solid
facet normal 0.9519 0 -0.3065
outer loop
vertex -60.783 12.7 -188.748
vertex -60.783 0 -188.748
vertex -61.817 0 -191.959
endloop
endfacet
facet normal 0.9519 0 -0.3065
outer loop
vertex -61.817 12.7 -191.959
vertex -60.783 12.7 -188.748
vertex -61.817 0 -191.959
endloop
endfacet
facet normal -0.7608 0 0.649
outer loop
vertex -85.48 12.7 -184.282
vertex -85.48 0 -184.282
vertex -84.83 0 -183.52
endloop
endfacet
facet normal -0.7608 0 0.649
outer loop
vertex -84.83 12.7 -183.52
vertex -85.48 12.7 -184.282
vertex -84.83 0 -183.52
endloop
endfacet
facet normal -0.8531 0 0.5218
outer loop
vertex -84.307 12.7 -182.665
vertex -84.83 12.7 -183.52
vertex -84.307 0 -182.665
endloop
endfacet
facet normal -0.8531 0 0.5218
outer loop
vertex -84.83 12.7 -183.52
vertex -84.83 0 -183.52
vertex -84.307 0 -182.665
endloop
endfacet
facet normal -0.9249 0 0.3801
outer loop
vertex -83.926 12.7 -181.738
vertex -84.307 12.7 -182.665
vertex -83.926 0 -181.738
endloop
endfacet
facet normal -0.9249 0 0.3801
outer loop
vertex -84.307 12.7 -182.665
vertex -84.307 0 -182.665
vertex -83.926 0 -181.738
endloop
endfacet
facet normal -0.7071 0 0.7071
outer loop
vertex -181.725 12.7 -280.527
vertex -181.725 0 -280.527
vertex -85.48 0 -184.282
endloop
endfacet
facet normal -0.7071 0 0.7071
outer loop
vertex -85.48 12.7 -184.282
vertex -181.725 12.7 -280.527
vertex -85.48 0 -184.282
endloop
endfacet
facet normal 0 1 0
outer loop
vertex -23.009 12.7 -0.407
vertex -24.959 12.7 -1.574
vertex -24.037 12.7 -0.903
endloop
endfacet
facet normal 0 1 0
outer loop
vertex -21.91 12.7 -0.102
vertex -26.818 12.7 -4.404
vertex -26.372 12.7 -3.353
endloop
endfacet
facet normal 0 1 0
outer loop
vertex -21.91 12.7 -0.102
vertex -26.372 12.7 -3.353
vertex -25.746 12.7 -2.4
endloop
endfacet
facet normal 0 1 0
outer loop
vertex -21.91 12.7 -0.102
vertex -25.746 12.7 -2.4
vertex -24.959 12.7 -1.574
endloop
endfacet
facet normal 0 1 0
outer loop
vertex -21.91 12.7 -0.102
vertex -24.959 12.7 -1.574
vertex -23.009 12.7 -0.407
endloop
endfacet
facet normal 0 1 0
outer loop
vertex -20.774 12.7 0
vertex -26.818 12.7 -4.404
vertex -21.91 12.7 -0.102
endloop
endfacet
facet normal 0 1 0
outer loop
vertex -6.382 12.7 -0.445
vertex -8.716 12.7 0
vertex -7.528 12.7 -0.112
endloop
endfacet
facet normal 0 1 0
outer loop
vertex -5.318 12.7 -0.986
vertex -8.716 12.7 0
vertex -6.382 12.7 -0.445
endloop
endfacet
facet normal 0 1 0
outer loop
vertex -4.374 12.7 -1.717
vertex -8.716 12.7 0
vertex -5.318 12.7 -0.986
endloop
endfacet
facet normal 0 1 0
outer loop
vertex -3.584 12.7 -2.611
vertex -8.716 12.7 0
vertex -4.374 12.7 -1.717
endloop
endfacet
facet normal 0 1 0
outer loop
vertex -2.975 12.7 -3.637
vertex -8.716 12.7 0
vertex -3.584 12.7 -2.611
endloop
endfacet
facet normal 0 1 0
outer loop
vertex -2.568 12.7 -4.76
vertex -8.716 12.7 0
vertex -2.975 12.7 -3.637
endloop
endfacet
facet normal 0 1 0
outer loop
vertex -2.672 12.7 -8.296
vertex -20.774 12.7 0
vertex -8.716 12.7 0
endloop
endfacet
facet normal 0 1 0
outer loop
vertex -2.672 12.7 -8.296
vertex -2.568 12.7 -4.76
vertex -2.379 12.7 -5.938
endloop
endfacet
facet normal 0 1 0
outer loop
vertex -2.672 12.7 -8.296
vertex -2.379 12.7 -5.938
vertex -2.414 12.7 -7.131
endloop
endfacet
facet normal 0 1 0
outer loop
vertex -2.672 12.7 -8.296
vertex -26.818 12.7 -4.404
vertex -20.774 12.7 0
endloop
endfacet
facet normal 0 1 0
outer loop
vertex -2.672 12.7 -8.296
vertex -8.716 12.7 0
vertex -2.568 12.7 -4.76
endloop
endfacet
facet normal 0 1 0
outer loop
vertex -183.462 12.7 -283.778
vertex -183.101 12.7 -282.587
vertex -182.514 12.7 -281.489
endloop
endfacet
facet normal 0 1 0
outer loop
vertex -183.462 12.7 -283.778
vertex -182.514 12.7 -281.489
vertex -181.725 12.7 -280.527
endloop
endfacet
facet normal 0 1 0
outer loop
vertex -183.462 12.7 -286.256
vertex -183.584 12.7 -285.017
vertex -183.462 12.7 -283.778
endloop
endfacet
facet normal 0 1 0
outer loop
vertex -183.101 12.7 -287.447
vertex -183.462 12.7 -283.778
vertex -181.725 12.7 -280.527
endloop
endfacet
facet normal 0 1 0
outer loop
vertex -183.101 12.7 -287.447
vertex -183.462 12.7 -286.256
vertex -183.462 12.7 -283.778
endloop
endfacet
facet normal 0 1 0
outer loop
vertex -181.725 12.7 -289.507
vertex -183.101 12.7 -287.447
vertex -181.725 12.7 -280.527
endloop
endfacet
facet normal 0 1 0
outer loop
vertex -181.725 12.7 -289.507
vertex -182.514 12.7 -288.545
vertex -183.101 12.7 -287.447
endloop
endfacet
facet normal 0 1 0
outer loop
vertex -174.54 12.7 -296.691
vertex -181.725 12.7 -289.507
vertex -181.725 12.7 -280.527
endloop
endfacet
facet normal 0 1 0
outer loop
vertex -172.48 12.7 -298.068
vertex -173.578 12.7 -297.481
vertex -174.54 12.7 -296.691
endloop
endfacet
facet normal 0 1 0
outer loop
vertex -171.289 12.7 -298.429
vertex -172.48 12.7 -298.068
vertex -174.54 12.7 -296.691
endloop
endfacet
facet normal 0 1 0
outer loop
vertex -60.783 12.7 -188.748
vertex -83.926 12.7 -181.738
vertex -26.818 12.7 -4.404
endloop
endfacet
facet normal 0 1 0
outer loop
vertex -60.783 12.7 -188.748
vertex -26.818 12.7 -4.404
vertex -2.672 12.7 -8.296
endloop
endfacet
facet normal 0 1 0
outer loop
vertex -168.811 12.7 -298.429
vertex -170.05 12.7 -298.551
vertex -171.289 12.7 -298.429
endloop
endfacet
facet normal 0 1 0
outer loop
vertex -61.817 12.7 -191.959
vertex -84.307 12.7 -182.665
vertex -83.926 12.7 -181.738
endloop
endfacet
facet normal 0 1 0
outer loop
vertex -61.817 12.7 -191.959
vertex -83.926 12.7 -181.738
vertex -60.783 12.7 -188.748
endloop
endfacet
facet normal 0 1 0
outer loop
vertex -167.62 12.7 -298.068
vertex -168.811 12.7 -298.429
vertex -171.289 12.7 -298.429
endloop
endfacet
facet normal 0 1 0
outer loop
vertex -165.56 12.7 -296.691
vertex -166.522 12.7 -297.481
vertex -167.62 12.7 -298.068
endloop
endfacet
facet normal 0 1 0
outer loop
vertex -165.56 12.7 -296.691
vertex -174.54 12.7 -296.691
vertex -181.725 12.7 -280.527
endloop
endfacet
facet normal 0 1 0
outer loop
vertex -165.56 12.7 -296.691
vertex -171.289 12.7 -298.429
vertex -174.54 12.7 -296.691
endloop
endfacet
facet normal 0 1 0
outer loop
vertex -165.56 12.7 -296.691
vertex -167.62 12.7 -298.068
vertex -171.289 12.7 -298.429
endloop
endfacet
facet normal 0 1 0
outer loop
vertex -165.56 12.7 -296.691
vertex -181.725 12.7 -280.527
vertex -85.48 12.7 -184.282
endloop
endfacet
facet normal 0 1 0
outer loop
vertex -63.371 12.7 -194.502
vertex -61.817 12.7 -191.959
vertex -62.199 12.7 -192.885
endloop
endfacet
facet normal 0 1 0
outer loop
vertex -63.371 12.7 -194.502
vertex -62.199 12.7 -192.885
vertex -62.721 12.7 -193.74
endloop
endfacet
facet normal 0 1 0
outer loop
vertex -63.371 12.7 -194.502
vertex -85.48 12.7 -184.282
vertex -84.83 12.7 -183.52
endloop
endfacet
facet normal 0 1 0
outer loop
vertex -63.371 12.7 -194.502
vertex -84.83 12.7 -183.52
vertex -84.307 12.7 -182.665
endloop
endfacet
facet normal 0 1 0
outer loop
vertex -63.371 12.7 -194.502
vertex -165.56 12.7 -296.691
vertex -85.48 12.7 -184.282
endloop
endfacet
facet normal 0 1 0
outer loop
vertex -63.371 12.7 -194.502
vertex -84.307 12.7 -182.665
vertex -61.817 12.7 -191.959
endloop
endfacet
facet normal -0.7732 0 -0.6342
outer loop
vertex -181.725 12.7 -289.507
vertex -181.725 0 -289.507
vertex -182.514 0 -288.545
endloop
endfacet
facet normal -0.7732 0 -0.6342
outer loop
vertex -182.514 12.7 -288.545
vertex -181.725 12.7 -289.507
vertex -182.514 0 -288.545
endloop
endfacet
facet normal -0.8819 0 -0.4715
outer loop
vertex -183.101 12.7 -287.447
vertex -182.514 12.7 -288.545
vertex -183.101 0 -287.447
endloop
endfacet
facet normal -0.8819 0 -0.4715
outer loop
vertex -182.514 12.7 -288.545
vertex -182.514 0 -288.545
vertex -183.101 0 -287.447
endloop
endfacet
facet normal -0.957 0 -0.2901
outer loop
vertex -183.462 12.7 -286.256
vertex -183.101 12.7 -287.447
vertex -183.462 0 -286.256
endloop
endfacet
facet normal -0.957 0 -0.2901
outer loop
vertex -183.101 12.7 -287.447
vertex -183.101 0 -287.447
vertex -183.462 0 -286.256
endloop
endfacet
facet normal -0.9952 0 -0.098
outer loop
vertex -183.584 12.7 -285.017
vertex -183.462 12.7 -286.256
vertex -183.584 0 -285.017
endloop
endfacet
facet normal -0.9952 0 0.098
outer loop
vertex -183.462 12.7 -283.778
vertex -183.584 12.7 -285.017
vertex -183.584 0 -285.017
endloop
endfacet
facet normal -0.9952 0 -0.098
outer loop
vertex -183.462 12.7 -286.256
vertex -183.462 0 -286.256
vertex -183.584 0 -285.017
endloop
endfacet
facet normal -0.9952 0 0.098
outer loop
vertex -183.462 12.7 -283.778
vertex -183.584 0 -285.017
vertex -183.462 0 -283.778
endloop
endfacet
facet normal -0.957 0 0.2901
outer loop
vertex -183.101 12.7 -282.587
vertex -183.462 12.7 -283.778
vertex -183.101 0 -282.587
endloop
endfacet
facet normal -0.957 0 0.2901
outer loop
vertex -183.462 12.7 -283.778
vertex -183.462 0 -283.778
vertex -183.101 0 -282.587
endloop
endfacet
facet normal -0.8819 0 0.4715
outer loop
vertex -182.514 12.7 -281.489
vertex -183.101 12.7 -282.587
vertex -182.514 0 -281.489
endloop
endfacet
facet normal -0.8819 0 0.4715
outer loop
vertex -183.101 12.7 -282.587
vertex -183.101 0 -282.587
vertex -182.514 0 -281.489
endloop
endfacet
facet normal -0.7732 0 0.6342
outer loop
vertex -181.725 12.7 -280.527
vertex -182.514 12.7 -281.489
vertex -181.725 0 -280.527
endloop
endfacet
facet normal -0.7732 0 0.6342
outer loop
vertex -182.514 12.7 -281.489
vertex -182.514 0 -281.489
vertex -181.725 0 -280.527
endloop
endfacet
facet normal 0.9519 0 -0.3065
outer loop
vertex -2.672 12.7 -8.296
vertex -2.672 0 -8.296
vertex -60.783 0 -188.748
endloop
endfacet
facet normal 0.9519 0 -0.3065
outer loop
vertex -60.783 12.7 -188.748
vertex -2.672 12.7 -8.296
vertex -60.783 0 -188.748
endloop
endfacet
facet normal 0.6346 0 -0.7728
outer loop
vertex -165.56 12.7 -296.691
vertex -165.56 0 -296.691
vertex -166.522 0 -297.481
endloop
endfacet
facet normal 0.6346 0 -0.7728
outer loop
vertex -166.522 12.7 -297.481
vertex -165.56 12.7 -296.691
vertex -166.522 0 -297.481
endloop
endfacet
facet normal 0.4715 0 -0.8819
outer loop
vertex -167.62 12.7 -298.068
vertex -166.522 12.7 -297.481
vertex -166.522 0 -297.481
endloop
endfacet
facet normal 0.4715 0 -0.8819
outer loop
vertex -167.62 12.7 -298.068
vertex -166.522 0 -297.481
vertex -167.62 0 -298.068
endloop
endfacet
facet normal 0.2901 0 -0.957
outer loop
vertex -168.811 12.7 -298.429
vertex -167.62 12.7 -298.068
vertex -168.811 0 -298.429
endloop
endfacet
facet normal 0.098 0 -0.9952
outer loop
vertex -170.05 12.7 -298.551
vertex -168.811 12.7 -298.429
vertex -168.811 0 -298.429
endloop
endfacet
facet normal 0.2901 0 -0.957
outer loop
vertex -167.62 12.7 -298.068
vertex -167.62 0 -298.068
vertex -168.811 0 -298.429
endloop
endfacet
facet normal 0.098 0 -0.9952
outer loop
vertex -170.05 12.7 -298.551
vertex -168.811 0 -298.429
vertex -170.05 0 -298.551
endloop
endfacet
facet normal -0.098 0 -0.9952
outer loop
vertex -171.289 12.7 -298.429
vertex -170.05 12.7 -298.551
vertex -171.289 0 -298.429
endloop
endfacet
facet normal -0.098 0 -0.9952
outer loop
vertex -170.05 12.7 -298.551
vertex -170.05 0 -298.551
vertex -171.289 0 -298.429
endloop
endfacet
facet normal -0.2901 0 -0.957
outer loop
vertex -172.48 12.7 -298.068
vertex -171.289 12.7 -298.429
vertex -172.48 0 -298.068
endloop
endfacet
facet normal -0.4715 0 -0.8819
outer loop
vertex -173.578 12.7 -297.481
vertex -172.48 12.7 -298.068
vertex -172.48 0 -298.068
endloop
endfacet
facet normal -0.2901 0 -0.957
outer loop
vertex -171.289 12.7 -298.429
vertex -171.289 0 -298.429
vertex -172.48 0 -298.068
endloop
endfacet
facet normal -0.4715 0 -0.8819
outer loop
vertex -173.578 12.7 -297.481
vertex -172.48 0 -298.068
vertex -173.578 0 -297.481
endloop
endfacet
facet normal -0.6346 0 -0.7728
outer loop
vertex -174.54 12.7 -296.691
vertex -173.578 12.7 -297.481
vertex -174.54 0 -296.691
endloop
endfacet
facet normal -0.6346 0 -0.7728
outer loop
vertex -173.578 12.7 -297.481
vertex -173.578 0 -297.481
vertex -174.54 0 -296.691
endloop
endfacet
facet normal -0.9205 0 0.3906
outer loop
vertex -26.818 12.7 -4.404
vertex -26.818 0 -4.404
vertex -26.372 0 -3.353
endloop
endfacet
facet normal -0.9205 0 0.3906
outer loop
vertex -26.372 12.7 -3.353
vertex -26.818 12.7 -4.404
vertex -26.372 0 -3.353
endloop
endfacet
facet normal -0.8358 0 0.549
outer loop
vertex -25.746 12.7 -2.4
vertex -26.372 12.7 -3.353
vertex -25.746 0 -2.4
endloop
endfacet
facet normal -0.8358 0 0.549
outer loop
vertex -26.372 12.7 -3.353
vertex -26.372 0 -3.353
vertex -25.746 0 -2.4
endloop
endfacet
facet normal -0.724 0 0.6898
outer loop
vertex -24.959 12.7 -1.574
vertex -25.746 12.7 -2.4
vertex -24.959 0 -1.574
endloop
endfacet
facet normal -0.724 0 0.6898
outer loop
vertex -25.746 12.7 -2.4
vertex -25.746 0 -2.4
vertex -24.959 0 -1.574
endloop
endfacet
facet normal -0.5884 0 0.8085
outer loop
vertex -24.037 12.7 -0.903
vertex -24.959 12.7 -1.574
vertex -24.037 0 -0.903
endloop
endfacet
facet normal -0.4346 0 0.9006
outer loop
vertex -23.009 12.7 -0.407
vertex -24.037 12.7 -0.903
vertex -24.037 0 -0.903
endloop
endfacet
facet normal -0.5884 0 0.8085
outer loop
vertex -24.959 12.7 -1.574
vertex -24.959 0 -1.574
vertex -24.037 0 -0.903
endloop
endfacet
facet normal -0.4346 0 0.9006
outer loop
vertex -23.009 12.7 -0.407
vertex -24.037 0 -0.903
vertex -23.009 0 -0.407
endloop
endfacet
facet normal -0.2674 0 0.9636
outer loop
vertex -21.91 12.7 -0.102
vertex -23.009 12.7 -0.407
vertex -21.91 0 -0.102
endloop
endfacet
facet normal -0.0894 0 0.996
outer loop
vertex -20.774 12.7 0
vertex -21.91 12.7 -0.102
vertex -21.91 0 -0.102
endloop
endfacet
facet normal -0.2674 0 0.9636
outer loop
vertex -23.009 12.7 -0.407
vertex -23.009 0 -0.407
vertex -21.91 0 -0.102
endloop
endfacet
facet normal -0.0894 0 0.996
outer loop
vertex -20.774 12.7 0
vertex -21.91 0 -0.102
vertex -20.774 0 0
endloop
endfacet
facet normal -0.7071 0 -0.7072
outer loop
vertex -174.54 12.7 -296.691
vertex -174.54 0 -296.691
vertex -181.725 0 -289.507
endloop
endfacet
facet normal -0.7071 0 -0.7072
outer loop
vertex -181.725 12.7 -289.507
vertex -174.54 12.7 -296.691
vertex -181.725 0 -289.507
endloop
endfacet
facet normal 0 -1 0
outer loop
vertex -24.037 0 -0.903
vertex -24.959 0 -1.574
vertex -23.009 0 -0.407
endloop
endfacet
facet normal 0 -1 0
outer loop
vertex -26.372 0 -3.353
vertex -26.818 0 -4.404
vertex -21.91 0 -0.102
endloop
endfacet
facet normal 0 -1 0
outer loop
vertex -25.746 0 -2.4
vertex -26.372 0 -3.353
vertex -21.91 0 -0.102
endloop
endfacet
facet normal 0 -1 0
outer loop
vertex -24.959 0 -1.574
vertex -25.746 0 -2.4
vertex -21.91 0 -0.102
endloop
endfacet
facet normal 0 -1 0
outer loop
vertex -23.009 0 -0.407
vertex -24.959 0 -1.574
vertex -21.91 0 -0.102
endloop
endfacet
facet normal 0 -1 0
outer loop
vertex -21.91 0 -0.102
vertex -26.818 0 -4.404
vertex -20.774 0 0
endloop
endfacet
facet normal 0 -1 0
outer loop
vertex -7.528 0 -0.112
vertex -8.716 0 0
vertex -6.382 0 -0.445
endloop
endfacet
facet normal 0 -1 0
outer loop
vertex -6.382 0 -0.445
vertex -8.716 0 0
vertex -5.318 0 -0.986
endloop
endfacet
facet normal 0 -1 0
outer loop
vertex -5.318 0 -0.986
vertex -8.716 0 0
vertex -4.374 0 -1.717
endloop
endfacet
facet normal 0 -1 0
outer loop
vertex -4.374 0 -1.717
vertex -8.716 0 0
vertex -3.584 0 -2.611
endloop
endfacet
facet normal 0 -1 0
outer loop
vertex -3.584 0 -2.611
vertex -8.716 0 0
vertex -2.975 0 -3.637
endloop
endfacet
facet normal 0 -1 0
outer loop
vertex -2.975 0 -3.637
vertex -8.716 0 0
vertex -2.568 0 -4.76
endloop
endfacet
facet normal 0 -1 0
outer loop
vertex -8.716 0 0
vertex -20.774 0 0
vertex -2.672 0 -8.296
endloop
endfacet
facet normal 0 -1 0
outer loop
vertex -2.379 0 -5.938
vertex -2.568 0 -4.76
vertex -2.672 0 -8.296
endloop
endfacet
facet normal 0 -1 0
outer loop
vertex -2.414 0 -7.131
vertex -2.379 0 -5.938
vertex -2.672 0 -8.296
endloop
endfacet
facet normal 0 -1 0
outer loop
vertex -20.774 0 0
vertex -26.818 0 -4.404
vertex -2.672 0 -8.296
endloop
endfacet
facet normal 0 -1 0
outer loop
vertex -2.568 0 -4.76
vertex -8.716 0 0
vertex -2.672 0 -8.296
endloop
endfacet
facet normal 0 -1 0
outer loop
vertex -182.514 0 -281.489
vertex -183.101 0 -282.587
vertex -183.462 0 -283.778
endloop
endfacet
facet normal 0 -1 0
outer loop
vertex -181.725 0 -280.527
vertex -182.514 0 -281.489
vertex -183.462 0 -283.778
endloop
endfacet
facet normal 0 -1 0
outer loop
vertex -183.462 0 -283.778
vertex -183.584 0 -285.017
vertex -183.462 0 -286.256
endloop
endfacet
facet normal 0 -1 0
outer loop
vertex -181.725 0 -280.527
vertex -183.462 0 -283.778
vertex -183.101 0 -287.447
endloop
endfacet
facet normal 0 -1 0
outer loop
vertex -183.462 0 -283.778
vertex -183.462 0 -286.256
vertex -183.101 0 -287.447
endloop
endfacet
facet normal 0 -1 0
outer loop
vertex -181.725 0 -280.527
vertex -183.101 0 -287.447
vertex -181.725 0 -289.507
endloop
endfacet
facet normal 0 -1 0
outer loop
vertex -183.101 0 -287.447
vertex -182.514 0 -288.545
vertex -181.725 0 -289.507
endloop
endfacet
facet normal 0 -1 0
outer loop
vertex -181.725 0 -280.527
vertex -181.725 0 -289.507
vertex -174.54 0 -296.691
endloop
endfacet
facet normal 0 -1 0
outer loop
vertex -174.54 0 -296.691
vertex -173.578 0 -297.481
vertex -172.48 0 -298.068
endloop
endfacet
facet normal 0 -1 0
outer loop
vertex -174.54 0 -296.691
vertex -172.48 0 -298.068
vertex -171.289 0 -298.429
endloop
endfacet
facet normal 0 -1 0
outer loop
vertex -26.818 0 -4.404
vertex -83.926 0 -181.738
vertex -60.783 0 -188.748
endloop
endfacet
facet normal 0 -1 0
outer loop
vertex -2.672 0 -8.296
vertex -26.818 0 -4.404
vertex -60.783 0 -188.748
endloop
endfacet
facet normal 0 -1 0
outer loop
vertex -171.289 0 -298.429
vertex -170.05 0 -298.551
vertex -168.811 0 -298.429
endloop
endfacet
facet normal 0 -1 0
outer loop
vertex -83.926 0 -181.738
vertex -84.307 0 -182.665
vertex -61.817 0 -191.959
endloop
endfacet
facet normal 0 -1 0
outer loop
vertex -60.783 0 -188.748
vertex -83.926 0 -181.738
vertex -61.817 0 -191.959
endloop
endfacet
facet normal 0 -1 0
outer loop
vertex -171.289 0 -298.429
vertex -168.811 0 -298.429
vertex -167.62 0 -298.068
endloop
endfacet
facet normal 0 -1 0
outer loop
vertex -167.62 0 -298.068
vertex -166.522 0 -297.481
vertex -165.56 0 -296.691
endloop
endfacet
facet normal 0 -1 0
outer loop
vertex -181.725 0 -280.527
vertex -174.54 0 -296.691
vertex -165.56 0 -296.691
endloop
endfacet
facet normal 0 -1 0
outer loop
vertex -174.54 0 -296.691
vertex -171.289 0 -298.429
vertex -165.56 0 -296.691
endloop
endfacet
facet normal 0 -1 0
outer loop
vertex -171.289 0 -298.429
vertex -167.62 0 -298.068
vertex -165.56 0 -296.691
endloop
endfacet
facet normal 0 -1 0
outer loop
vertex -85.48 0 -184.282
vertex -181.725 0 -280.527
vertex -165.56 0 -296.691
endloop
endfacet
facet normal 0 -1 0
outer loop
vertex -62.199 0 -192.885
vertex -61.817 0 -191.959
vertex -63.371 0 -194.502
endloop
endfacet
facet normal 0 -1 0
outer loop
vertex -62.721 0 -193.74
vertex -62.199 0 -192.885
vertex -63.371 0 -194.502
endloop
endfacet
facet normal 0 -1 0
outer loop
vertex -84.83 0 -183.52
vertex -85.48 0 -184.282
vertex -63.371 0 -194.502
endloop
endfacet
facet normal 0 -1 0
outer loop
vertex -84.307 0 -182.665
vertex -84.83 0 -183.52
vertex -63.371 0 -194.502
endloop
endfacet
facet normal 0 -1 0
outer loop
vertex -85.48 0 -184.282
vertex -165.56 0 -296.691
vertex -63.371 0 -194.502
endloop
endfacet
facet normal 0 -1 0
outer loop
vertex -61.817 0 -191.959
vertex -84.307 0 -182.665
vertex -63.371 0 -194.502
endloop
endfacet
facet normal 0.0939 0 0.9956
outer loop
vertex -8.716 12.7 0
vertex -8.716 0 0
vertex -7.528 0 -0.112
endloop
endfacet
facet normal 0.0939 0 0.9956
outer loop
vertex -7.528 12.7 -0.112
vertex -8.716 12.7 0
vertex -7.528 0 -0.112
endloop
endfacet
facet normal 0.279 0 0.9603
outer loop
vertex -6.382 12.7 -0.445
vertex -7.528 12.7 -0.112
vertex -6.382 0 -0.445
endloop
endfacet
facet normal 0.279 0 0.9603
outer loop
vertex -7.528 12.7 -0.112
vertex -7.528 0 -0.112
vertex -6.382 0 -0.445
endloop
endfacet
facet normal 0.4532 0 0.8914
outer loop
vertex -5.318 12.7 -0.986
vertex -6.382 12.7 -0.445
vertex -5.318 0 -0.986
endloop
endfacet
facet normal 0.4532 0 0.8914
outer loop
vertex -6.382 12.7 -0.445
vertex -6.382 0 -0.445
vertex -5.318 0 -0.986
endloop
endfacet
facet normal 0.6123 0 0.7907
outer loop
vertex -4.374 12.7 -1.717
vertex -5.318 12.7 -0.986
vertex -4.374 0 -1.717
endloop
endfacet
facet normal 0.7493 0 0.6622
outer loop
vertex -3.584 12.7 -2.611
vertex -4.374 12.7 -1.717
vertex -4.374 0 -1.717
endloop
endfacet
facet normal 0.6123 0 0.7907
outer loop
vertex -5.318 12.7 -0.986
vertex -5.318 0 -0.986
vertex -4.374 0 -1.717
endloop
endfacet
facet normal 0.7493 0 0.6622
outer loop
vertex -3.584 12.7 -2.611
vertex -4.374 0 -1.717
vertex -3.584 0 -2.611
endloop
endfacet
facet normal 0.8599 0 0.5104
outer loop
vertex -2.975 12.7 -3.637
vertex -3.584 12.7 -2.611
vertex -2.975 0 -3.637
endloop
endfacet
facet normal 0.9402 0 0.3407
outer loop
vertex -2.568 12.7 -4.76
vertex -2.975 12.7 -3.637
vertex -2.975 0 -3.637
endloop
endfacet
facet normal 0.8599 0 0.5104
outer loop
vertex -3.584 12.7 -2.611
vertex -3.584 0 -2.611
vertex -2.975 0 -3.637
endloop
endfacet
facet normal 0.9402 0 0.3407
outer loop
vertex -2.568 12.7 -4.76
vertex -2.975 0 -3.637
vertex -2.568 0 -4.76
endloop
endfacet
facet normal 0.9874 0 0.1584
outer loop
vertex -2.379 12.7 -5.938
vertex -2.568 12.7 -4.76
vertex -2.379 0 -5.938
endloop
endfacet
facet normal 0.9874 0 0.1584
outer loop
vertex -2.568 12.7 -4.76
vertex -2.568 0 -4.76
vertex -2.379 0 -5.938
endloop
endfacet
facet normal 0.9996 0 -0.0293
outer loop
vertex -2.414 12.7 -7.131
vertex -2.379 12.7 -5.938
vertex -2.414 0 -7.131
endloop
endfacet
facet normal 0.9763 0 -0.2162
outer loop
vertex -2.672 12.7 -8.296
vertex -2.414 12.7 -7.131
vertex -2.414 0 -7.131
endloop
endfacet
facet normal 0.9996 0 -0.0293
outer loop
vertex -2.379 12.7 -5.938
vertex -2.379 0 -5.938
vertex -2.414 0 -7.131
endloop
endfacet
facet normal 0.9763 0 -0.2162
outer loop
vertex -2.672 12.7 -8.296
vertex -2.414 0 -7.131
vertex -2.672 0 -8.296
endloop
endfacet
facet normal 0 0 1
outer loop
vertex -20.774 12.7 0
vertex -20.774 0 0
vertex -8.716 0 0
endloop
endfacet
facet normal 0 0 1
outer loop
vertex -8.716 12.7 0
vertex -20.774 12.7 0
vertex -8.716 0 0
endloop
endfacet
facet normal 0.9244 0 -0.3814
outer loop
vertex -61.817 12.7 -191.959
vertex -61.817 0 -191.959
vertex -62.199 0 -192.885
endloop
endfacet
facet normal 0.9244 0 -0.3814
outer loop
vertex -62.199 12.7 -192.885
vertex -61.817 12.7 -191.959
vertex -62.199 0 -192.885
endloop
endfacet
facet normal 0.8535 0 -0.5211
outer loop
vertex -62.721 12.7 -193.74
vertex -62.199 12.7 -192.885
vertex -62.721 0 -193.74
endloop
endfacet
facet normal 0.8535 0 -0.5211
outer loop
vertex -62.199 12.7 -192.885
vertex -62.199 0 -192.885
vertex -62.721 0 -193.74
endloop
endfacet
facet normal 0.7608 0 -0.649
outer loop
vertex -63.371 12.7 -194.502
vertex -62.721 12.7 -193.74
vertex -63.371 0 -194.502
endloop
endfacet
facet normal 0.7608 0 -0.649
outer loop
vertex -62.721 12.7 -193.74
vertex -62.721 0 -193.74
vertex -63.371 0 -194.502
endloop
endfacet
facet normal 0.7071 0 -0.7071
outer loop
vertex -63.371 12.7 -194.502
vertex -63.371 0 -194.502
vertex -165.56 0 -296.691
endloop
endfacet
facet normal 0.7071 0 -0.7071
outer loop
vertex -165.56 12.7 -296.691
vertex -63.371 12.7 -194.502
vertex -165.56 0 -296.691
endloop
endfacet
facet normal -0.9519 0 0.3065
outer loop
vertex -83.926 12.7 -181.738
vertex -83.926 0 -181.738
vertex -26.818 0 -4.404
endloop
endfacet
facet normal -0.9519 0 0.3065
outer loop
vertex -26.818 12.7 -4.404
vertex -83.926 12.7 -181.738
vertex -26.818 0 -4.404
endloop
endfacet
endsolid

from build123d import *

# Parameters (mm, degrees)
BOSS_EXTRUDE1_DEPTH = 12.7


with BuildPart() as part:
    # Sketch1 → Boss-Extrude1 (new body)
    with BuildSketch(Plane(origin=(0, 0, 0), x_dir=(1, 0, 0), z_dir=(0, 1, 0))):
        with BuildLine():
            Line((-2.671745921, 8.296474175), (-60.783183135, 188.74777921))
            Line((-60.783183135, 188.74777921), (-61.817176572, 191.958600936))
            ThreePointArc((-61.817176572, 191.958600936), (-62.442896831, 193.322917601), (-63.371363054, 194.502254821))
            Line((-63.371363054, 194.502254821), (-65.756579877, 196.887471644))
            Line((-65.756579877, 196.887471644), (-165.560118982, 296.691010749))
            ThreePointArc((-165.560118982, 296.691010749), (-170.050247042, 298.550882688), (-174.540375103, 296.691010749))
            Line((-174.540375103, 296.691010749), (-181.72458, 289.506805852))
            ThreePointArc((-181.72458, 289.506805852), (-183.584451939, 285.016677791), (-181.72458, 280.526549731))
            Line((-181.72458, 280.526549731), (-85.480125087, 184.282094819))
            ThreePointArc((-85.480125087, 184.282094819), (-84.551658864, 183.102757598), (-83.925938605, 181.738440933))
            Line((-83.925938605, 181.738440933), (-26.818084588, 4.403525825))
            ThreePointArc((-26.818084588, 4.403525825), (-24.512913596, 1.217621847), (-20.773770045, 0))
            Line((-20.773770045, 0), (-8.716060463, 0))
            ThreePointArc((-8.716060463, 0), (-3.58368231, 2.610856449), (-2.671745921, 8.296474175))
        make_face()
    extrude(amount=BOSS_EXTRUDE1_DEPTH)


solid = part.part
